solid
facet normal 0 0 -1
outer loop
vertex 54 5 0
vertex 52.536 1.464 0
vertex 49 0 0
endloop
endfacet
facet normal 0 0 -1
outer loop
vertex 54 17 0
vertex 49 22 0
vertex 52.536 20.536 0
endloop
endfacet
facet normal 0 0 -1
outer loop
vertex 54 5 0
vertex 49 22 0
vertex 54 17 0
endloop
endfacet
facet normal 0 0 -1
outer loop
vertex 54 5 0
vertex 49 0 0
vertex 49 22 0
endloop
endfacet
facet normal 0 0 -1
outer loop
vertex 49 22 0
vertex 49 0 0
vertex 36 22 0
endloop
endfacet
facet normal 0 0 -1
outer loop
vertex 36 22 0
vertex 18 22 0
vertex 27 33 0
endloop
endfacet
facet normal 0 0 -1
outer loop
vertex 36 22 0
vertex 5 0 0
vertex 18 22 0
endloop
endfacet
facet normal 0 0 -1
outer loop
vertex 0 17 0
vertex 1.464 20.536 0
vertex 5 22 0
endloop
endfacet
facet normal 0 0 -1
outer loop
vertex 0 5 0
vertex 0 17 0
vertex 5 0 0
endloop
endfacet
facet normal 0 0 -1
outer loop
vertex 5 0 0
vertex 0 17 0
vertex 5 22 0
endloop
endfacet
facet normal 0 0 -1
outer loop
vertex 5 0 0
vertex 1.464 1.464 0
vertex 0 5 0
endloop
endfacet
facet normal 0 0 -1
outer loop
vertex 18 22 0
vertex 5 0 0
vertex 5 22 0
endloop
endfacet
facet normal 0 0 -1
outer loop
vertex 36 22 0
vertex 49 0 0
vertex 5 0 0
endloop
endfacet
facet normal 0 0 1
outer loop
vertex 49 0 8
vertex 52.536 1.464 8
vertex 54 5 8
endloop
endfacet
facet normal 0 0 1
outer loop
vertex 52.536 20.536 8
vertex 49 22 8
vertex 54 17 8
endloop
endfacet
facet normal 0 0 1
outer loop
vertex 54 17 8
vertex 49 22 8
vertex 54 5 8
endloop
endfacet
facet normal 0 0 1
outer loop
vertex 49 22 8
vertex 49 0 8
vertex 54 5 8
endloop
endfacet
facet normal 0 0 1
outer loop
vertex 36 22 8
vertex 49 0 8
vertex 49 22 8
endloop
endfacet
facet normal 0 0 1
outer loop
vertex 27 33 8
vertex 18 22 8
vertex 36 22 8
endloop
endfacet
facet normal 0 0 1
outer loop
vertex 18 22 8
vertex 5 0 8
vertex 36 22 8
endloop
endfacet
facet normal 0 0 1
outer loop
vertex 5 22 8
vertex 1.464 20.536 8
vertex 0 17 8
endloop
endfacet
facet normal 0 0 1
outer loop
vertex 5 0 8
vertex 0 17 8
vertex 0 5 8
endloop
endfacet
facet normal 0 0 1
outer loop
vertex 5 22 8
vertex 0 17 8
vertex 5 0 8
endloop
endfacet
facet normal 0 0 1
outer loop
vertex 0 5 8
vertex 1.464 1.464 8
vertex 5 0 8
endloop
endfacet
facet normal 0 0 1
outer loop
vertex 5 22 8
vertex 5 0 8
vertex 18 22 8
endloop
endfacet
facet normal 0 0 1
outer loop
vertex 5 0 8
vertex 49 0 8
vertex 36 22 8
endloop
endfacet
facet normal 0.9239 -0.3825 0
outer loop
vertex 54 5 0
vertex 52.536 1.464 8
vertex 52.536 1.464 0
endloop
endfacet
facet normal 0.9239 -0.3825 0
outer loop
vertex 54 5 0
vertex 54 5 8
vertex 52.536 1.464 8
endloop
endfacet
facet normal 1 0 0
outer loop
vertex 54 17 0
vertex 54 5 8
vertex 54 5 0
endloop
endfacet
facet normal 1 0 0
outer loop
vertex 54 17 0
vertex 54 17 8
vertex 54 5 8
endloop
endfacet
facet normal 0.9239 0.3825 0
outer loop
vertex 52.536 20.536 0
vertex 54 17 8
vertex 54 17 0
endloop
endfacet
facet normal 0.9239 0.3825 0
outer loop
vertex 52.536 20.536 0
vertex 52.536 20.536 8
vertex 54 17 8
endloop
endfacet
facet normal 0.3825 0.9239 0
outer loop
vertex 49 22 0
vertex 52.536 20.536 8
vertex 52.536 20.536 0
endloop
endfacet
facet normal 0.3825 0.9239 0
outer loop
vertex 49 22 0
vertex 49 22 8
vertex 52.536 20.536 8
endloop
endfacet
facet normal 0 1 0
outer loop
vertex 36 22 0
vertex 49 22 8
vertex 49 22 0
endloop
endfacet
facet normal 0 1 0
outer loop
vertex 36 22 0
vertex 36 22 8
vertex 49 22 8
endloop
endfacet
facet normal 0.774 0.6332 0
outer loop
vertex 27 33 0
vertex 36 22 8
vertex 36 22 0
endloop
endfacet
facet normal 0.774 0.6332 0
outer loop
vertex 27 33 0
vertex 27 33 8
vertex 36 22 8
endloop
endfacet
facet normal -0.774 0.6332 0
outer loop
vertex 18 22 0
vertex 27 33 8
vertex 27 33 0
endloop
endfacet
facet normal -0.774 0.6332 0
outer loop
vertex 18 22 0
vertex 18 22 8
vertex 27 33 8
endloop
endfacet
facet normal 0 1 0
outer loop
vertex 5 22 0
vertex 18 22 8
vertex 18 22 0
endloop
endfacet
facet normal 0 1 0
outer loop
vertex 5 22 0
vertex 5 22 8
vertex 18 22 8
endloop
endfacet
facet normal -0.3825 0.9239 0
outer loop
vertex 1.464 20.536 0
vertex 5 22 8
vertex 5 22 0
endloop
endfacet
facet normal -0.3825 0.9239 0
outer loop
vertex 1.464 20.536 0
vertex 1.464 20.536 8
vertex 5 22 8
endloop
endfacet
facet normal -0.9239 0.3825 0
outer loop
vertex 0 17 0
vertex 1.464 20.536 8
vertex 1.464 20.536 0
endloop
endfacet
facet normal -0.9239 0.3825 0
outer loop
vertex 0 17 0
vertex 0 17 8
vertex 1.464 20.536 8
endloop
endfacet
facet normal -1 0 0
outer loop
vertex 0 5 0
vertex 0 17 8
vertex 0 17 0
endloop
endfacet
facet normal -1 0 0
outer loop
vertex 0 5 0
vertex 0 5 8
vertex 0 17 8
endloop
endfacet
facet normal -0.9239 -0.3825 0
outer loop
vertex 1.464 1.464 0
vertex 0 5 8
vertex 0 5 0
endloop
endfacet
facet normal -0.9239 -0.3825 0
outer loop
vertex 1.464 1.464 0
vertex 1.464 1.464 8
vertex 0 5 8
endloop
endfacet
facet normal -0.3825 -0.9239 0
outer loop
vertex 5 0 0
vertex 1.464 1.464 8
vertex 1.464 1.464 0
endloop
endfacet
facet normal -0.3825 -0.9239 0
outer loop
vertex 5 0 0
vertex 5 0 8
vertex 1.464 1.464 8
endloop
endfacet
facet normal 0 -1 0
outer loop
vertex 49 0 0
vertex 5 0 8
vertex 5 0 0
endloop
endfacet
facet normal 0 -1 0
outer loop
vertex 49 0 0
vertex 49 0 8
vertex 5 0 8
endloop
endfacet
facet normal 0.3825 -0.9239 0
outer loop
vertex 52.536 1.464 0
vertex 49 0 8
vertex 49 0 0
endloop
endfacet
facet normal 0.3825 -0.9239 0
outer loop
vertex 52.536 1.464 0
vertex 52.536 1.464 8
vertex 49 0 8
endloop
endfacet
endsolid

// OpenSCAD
$fn = 32;

// ----------------------------------------------------------------------
// Ratchet pawl: 54 x 22 mm body, beak 11 mm сверху
// ----------------------------------------------------------------------

// --- parameters (mm) ---
profile_height = 8;       // extrusion height
profile_points = 15;      // points of the closed outline

profile = [[0, 5], [1.464, 1.464], [5, 0], [49, 0], [52.536, 1.464], [54, 5], [54, 17], [52.536, 20.536], [49, 22], [36, 22], [27, 33], [18, 22], [5, 22], [1.464, 20.536], [0, 17]];  // single closed polygon, 15 points, counter clockwise

// --- the one profile operation ---
linear_extrude(height = profile_height) polygon(points = profile);
